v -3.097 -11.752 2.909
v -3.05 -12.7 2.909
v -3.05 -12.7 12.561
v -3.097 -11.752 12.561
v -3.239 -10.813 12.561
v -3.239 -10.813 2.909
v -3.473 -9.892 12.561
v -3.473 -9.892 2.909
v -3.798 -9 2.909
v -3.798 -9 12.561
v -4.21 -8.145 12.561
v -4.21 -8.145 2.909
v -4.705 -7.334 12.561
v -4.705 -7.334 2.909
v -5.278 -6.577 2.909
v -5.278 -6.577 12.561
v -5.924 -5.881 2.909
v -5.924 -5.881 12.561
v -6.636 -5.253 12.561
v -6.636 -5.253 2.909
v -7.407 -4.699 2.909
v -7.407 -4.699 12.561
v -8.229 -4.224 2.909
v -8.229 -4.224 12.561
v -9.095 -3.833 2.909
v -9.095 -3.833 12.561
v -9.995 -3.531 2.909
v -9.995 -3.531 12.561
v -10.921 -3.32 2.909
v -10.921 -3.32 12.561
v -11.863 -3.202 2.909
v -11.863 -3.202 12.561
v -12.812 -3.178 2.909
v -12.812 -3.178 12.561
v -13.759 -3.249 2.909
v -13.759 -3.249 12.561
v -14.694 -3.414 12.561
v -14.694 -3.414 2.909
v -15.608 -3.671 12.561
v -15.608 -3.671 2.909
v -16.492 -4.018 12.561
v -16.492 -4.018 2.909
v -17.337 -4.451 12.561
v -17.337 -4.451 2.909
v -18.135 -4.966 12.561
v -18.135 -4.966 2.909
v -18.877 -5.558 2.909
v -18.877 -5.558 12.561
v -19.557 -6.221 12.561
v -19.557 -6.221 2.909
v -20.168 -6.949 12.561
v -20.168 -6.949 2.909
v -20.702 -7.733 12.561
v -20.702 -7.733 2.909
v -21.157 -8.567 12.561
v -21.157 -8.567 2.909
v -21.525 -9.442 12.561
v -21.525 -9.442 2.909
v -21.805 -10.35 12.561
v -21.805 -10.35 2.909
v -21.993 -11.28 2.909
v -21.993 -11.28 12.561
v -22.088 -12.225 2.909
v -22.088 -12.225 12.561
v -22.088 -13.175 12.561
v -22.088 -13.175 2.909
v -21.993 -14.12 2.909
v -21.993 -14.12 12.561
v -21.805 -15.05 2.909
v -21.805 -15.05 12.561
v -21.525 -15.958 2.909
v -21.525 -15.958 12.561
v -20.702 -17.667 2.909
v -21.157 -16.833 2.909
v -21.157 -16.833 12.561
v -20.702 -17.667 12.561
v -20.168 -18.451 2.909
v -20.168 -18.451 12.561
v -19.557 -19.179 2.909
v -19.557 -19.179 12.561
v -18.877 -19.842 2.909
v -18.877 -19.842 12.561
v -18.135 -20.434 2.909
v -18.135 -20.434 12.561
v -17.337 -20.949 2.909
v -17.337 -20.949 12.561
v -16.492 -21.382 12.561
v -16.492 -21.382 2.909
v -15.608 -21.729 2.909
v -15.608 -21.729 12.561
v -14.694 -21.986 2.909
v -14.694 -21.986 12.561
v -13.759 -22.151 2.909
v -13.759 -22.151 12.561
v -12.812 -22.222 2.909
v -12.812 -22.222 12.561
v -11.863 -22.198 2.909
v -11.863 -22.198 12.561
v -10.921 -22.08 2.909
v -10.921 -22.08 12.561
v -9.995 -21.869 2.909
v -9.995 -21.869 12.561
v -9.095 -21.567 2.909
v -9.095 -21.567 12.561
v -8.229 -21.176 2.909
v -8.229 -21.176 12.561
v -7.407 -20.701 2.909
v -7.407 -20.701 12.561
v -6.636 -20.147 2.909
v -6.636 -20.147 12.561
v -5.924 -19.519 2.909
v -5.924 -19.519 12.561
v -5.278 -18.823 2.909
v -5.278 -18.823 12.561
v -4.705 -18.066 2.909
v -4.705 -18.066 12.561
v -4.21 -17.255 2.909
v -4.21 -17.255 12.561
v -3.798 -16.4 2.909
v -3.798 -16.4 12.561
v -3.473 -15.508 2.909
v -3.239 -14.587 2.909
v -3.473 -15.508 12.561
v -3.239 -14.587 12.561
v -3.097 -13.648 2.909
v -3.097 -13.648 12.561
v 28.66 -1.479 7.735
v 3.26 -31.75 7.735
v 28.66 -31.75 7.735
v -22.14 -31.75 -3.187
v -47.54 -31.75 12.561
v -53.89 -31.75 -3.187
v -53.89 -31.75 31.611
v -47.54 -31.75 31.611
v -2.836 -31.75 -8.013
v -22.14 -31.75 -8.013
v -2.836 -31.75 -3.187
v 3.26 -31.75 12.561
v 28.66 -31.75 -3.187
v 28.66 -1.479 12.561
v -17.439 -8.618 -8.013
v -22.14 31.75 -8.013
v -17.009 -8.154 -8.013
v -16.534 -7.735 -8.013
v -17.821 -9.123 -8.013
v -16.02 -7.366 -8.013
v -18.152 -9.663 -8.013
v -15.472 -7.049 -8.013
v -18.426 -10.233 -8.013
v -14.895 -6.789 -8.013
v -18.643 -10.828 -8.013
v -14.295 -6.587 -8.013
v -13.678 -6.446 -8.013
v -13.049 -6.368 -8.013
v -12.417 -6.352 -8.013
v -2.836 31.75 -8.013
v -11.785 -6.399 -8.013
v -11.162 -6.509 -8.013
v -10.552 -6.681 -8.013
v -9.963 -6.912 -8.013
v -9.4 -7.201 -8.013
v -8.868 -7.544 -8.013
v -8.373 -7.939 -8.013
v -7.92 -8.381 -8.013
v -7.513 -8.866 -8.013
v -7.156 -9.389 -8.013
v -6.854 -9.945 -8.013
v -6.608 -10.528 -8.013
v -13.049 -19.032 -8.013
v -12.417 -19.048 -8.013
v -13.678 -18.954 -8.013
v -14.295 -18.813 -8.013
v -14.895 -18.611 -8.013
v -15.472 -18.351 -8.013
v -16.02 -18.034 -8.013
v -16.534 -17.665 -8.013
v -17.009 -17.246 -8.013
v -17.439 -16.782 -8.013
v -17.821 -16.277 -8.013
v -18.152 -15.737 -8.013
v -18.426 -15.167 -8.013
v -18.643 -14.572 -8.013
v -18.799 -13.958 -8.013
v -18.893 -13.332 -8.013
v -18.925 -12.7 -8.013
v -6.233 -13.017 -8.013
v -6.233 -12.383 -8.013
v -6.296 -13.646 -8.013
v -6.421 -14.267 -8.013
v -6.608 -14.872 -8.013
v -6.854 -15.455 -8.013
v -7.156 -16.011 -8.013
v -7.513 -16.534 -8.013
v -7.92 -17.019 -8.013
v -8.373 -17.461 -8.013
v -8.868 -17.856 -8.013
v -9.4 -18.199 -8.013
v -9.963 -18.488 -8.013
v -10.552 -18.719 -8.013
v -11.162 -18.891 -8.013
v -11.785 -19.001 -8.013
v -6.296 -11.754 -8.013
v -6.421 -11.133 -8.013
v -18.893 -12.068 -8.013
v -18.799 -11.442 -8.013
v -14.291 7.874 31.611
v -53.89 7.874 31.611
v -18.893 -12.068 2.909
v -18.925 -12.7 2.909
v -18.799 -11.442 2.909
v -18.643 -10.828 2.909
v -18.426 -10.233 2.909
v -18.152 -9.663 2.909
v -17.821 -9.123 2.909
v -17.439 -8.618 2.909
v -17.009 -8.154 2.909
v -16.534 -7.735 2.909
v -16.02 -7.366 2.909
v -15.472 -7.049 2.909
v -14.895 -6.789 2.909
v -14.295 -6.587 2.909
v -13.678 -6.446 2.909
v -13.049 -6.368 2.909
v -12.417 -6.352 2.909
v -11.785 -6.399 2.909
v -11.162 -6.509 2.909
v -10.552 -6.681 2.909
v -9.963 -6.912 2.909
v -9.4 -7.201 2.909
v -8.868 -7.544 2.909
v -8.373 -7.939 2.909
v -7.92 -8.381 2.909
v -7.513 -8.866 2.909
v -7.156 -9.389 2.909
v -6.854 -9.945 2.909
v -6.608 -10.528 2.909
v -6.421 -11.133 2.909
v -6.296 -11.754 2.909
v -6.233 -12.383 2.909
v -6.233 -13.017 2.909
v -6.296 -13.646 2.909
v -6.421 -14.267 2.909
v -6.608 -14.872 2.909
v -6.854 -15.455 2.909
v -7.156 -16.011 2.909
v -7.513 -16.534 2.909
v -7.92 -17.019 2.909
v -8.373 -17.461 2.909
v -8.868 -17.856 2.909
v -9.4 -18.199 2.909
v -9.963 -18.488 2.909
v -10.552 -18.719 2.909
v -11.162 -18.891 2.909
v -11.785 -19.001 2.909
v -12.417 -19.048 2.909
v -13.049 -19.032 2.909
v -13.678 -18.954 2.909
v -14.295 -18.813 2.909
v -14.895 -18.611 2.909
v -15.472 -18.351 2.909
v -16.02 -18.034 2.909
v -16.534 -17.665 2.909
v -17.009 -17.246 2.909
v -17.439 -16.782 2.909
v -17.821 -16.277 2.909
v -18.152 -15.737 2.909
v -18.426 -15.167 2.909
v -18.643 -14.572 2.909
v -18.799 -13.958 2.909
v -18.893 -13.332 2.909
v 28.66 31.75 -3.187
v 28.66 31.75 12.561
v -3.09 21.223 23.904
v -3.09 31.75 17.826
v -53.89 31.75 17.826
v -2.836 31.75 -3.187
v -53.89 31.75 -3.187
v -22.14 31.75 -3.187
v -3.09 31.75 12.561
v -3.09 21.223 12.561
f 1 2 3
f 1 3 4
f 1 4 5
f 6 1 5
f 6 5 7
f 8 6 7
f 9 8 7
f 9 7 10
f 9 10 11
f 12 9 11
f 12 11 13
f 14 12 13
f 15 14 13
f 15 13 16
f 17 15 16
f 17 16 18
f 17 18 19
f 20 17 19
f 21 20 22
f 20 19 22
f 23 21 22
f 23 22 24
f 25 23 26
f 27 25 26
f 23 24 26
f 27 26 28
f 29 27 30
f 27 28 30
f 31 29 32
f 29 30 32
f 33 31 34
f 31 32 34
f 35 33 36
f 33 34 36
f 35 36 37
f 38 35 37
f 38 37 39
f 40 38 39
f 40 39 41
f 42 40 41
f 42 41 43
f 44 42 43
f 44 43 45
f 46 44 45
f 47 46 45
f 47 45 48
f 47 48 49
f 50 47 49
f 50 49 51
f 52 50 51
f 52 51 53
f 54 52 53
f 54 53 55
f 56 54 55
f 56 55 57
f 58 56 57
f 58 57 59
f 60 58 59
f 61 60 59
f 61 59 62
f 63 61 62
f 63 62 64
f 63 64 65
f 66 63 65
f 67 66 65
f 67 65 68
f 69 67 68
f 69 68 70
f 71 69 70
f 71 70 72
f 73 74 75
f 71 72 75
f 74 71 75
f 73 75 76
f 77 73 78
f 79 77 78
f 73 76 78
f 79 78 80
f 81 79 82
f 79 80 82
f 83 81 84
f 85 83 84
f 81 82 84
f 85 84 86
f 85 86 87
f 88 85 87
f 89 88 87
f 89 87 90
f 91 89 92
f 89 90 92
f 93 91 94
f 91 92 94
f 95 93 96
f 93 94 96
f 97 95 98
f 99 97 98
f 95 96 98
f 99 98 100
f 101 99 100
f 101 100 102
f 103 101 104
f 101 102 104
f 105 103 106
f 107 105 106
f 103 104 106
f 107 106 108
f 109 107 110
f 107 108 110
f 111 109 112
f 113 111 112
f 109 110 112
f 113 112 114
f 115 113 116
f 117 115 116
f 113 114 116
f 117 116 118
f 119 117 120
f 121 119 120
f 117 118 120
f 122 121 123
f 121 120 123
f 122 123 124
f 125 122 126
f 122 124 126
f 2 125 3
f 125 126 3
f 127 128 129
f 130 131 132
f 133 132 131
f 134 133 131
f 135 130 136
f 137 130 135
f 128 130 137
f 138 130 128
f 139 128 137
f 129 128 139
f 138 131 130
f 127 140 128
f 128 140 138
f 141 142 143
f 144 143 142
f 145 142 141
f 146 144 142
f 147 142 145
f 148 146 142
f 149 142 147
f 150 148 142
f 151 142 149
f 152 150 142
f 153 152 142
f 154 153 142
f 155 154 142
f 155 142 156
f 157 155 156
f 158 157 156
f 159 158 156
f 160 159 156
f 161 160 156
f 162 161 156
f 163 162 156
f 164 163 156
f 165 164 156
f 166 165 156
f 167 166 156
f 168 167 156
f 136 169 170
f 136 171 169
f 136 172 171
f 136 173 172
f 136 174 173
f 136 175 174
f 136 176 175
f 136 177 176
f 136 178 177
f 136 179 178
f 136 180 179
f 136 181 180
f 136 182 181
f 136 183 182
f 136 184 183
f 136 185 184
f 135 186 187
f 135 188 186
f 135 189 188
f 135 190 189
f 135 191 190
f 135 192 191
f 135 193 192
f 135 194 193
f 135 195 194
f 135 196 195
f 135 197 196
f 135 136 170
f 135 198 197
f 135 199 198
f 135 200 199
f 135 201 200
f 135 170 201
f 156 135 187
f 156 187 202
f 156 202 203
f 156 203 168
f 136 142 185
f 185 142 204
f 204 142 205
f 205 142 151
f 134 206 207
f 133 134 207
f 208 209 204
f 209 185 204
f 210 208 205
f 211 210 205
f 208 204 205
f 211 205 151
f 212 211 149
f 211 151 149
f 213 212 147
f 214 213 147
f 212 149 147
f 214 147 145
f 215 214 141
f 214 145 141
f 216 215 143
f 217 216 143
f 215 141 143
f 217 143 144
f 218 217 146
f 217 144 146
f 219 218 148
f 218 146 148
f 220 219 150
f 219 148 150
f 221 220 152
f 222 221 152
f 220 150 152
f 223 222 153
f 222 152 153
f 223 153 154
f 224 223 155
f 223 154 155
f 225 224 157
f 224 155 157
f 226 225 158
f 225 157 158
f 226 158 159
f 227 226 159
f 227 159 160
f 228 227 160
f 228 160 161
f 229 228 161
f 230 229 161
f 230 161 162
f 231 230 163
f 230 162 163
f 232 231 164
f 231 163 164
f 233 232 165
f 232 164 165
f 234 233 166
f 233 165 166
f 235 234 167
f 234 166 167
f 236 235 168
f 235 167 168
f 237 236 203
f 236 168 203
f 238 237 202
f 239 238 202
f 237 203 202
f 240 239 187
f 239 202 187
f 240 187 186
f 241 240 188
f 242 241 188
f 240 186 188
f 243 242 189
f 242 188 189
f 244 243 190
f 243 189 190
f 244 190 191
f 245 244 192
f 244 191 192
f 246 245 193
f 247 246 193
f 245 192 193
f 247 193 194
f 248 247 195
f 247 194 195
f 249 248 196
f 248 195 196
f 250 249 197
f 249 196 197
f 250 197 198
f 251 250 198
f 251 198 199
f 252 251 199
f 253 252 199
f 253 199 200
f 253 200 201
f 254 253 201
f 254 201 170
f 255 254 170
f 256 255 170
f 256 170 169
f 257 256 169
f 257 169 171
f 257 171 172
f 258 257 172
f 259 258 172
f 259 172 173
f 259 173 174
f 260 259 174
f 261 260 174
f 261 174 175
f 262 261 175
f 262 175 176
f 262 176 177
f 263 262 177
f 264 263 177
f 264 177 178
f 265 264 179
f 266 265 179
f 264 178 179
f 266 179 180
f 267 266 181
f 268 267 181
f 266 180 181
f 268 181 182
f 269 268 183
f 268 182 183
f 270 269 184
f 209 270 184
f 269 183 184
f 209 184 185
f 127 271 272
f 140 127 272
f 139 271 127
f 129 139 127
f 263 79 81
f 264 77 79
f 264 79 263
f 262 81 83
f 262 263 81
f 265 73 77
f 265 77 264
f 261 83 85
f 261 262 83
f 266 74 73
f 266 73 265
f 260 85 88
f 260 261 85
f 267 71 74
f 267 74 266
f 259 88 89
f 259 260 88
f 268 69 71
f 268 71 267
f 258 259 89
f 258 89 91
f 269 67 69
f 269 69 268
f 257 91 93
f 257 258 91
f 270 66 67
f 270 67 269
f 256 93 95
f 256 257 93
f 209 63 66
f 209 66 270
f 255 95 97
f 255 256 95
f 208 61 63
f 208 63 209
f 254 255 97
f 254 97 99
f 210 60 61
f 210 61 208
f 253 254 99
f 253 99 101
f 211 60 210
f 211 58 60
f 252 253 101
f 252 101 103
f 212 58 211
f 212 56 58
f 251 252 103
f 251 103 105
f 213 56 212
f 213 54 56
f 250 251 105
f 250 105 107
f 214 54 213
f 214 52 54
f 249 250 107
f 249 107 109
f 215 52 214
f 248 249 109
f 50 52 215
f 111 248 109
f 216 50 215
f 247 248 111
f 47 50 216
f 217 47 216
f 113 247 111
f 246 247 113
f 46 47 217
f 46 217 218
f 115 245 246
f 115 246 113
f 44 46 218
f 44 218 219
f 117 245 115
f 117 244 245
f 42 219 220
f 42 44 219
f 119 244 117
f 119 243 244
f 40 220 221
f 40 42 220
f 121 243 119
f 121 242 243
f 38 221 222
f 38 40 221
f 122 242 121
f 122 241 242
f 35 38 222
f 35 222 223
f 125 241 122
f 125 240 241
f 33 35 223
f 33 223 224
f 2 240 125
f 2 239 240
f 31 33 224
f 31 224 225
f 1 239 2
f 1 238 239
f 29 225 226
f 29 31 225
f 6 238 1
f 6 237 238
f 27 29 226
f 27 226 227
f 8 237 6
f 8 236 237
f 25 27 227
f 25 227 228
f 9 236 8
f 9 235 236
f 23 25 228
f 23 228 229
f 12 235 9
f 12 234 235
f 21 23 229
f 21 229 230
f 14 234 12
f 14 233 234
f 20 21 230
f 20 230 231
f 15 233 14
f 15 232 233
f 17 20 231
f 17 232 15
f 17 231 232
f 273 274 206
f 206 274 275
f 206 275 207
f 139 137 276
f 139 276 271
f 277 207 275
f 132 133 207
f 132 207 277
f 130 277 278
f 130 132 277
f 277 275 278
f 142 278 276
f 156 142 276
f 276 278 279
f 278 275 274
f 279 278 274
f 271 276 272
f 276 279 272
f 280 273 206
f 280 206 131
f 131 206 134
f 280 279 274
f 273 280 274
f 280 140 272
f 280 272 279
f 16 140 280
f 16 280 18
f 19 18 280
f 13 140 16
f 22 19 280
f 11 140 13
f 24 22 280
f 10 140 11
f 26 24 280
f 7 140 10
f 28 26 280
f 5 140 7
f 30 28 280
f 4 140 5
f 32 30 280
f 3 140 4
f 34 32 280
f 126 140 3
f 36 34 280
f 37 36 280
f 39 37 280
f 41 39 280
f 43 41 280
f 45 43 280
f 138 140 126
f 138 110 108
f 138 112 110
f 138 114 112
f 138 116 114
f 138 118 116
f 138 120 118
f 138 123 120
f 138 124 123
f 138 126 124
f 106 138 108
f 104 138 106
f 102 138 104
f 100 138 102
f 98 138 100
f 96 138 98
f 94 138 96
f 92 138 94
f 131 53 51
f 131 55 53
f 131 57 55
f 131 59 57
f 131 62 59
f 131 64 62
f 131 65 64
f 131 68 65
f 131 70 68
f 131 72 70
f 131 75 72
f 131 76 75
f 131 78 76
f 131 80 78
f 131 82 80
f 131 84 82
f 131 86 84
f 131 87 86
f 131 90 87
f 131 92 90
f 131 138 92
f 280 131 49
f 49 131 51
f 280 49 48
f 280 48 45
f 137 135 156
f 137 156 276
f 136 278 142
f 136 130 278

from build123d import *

# Parameters (mm, degrees)
F1_DEPTH       = 31.75
F3_DEPTH       = 19.05
F5_DEPTH       = 4.826
F7_DEPTH       = 52.4256
F9_D           = 12.7
F9_CBORE_D     = 19.05
F9_CBORE_DEPTH = 9.652


with BuildPart() as f1:
    # F0 (on Front) → F1 (new body, symmetric)
    with BuildSketch(Plane.XZ):
        Polygon((-22.139631, -8.012854), (-2.835631, -8.012854), (-2.835631, -3.186854), (28.660369, -3.186854), (28.660369, 12.561146), (-3.089631, 12.561146), (-3.089631, 31.611146), (-53.889631, 31.611146), (-53.889631, -3.186854), (-22.139631, -3.186854), align=None)
    extrude(amount=F1_DEPTH, both=True)

    # F2 (on face) → F3 (cut)
    with BuildSketch(Plane.XY.offset(31.611146)):
        Polygon((-3.089631, 21.223447), (-47.539631, -31.75), (-3.089631, -31.75), align=None)
    extrude(amount=-F3_DEPTH, mode=Mode.SUBTRACT)

    # F4 (on face) → F5 (cut)
    with BuildSketch(Plane.XY.offset(12.561146)):
        Polygon((3.260369, -31.75), (28.660369, -31.75), (28.660369, -1.479459), align=None)
    extrude(amount=-F5_DEPTH, mode=Mode.SUBTRACT)

    # F6 (on face) → F7 (cut)
    with BuildSketch(Plane(origin=(-53.889631, 0, 0), x_dir=(0, -1, 0), z_dir=(-1, 0, 0))):
        Polygon((-31.75, 17.826331), (-7.874, 31.611146), (-31.75, 31.611146), align=None)
    extrude(amount=-F7_DEPTH, mode=Mode.SUBTRACT)

    # F9 (through all)
    with Locations(Plane.XY.offset(12.561146)):
        with Locations((-12.574879, -12.7)):
            CounterBoreHole(F9_D / 2, F9_CBORE_D / 2, F9_CBORE_DEPTH)


solid = f1.part
